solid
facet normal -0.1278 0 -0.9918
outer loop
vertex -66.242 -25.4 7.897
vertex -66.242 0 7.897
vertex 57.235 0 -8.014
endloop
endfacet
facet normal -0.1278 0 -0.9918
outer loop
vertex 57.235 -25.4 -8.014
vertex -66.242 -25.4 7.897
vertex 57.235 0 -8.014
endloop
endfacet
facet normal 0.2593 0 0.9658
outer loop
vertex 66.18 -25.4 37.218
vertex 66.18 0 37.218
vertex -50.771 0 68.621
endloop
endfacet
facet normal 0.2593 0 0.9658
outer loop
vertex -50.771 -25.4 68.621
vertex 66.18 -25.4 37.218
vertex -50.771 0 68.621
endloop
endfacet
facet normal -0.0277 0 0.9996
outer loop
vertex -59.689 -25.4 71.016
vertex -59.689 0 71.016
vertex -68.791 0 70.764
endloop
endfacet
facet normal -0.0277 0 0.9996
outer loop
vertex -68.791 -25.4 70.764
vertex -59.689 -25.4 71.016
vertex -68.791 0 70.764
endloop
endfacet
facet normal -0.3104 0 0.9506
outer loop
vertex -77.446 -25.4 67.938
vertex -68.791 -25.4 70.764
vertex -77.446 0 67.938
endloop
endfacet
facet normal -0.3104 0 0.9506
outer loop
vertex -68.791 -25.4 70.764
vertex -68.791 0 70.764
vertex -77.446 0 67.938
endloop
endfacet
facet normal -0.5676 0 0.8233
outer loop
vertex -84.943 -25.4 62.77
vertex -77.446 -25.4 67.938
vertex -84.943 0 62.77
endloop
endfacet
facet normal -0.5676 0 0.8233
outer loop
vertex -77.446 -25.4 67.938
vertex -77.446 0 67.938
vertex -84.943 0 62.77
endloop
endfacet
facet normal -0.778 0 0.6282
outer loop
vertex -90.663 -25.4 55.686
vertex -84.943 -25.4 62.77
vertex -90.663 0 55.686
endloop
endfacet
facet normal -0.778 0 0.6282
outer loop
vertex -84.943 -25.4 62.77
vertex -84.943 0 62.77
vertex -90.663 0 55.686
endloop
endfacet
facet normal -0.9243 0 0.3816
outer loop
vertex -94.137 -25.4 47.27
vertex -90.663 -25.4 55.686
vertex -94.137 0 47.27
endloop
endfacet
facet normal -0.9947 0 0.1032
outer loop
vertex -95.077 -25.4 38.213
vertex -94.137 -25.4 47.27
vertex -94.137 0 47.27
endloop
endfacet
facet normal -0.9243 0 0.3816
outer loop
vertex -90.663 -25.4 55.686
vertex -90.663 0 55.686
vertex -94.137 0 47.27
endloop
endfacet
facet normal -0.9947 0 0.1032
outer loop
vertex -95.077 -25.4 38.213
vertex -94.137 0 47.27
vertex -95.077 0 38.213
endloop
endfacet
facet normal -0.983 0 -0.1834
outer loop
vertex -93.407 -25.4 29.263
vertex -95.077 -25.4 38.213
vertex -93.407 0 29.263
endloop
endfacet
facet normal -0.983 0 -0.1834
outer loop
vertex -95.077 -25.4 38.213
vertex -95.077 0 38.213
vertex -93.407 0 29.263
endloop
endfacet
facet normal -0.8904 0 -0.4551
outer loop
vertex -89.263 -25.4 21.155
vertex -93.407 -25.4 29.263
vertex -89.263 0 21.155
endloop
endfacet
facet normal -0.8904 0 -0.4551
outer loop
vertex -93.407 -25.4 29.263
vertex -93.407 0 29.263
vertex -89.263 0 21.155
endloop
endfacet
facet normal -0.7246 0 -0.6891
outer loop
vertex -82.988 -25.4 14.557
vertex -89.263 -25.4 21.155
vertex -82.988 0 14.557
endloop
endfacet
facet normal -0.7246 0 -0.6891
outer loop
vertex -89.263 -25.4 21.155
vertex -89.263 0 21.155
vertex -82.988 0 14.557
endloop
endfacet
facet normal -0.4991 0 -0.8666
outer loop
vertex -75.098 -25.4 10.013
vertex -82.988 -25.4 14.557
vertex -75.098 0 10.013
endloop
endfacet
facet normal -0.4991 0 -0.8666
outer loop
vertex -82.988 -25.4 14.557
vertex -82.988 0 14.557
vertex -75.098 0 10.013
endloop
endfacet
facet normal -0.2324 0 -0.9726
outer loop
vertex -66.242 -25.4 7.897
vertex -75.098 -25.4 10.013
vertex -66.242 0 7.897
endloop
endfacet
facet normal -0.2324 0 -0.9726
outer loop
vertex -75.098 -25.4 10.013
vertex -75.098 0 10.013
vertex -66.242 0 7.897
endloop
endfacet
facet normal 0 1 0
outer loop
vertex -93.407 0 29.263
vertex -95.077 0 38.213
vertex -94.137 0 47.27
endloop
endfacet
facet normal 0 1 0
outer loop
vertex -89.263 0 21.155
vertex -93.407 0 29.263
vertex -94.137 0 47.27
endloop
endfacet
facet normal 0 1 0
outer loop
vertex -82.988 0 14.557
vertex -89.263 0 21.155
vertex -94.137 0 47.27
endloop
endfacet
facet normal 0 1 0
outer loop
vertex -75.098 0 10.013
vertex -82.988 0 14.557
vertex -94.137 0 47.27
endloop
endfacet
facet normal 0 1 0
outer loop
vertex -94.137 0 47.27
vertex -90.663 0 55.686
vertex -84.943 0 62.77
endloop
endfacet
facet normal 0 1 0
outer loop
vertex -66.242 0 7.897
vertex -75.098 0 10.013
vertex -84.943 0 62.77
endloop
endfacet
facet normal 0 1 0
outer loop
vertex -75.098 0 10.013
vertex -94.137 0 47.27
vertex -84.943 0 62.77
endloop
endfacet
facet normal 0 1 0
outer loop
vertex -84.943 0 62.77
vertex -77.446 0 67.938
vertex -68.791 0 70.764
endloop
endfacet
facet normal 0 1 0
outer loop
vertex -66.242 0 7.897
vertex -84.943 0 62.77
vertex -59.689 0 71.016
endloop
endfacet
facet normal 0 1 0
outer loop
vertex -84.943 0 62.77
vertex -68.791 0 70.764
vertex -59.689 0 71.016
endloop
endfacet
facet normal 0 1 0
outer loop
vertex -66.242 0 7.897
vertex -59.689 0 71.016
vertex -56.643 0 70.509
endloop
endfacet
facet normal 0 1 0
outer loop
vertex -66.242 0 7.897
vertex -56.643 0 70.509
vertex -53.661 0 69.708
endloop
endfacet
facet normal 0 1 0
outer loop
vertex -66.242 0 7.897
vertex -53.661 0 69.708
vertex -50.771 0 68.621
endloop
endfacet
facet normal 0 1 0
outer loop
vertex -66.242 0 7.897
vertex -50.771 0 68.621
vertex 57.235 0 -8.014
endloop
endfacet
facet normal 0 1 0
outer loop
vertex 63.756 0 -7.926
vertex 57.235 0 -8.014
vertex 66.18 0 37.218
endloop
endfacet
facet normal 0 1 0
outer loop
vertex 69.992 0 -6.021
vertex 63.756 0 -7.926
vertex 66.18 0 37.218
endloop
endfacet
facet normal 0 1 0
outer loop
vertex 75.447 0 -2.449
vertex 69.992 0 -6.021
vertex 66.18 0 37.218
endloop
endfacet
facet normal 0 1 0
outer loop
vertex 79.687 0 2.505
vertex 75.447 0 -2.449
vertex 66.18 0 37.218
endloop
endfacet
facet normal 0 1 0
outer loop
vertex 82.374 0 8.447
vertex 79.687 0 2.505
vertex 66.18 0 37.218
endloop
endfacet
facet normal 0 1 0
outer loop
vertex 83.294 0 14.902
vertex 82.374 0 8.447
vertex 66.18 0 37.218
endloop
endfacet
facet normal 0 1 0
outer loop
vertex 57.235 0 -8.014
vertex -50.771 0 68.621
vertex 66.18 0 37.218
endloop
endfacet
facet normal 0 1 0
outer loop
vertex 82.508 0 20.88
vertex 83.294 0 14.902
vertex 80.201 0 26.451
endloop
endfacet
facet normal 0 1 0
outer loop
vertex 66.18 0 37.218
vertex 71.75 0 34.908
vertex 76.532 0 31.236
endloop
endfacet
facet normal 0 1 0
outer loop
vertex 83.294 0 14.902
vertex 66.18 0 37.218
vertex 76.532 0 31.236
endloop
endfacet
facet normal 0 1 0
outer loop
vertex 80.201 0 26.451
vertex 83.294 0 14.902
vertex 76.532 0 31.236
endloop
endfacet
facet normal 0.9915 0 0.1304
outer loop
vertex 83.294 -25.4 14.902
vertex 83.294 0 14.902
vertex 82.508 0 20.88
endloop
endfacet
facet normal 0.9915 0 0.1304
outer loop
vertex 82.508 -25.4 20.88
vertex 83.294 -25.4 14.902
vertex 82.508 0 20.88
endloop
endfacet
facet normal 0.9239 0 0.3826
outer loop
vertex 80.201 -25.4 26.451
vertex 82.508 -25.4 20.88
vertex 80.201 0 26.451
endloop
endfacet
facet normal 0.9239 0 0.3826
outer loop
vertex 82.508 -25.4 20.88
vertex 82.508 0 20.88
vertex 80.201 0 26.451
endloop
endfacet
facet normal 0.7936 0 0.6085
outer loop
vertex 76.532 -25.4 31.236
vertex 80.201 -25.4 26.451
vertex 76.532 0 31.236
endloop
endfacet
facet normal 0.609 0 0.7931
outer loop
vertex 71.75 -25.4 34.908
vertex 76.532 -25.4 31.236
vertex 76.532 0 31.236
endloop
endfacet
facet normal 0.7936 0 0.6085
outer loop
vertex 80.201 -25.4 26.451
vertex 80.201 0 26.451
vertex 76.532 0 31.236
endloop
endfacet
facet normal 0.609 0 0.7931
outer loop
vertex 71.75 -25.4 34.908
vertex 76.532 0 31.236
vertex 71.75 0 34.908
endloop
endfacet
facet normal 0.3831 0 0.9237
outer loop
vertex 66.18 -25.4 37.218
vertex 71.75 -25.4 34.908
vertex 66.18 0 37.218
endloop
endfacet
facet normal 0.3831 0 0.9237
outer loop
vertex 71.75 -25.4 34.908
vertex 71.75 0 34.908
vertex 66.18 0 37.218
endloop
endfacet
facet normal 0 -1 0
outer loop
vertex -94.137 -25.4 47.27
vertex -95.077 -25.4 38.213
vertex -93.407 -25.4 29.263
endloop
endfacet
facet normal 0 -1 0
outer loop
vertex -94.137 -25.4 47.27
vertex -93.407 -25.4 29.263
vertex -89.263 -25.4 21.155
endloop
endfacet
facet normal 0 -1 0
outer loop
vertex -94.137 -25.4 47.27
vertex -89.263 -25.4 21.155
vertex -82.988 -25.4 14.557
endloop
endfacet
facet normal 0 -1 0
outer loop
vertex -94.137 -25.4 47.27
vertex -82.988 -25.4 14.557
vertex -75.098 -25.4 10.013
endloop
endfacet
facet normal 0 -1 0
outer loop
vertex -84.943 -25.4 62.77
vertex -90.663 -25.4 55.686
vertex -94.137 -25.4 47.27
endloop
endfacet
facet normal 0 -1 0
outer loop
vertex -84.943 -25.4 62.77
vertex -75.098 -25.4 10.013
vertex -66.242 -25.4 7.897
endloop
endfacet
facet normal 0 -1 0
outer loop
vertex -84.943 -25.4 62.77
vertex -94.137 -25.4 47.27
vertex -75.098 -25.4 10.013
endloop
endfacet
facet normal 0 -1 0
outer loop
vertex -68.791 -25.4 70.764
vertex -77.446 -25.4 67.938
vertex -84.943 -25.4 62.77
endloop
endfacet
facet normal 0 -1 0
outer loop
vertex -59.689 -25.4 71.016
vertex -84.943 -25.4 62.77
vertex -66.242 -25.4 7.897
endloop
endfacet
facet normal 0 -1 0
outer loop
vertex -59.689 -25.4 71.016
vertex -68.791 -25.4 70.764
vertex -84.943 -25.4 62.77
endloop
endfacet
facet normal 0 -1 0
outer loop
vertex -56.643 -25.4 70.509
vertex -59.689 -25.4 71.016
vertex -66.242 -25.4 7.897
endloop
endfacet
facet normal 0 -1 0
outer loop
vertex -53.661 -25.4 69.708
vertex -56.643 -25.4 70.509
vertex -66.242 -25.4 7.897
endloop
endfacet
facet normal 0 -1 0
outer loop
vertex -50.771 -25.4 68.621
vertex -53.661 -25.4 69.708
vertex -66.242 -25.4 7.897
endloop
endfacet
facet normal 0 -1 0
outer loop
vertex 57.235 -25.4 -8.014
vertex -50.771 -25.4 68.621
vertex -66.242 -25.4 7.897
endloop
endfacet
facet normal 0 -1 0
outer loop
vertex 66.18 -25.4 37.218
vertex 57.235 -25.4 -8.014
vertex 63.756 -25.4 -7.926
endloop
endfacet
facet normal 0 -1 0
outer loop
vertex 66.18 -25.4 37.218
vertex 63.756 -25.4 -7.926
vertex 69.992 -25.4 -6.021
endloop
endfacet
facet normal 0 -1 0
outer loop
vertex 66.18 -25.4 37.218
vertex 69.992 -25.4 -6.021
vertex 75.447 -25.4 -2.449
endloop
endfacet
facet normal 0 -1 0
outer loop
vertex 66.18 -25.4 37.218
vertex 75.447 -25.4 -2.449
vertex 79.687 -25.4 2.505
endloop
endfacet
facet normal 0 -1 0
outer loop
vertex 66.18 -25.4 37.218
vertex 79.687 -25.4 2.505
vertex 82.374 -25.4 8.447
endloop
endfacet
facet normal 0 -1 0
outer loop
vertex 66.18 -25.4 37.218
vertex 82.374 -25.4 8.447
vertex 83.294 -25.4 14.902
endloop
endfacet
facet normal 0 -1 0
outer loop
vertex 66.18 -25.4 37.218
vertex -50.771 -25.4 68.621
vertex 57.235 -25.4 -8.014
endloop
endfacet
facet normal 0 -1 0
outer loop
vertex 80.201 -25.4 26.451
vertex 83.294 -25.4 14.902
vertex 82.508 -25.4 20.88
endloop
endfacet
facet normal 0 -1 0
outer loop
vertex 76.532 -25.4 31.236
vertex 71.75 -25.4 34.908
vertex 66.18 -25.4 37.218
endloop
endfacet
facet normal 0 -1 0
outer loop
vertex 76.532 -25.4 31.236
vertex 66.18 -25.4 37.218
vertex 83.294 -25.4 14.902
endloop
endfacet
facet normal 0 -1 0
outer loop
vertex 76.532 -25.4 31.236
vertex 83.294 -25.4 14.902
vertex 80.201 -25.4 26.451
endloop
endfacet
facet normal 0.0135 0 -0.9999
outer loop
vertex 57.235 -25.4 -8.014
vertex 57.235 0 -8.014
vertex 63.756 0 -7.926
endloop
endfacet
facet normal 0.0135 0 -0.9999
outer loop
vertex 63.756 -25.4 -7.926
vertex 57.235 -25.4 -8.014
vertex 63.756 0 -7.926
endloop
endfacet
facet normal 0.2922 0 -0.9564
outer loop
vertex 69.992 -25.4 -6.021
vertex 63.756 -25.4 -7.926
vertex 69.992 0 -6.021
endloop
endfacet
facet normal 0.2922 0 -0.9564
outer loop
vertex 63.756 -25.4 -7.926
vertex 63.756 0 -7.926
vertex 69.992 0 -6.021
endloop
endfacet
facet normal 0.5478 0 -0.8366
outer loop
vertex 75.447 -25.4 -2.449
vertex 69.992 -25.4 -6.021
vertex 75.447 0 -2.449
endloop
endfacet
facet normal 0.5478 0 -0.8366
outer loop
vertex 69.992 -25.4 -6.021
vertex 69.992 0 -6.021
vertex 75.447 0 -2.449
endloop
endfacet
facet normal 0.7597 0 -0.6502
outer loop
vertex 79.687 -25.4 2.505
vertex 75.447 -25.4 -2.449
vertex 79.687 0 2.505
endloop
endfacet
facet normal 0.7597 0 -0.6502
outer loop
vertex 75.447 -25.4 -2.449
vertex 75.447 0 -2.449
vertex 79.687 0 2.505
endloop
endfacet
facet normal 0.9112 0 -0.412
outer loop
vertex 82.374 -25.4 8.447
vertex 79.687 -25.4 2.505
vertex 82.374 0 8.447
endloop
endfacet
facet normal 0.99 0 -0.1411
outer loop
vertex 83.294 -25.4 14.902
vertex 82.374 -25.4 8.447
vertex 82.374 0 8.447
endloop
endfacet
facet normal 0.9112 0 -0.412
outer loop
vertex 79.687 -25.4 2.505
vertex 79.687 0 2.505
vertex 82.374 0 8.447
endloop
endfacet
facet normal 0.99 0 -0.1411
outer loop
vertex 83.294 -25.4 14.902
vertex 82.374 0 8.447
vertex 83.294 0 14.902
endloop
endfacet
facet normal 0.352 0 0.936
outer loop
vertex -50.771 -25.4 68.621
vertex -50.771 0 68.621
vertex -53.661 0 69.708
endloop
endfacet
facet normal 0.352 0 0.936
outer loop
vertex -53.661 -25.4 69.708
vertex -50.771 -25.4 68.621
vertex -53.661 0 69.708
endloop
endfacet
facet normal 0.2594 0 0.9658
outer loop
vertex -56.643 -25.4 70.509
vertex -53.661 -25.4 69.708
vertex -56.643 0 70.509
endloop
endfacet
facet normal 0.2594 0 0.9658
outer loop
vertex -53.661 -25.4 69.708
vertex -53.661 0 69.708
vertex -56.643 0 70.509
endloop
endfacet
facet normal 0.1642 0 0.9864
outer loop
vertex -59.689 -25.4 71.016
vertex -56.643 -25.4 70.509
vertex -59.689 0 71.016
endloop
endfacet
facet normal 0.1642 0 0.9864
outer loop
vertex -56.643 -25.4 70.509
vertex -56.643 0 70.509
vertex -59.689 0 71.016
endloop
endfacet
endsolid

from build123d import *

# Parameters (mm, degrees)
F1_DEPTH = 25.4
F2_DEPTH = 25.4


with BuildPart() as f1:
    # F0 (on Front) → F1 (new body)
    with BuildSketch(Plane.XZ):
        with BuildLine():
            Line((-50.770752, 68.621059), (-59.689327, 71.015835))
            ThreePointArc((-59.689327, 71.015835), (-94.933334, 42.775326), (-66.24222, 7.897161))
            ThreePointArc((-66.24222, 7.897161), (-41.972825, 16.067976), (-31.63981, 39.498609))
            ThreePointArc((-31.63981, 39.498609), (-36.850348, 56.920649), (-50.770752, 68.621059))
        make_face()
        with BuildLine():
            ThreePointArc((-50.770752, 68.621059), (-55.142458, 70.144617), (-59.689327, 71.015835))
            Line((-59.689327, 71.015835), (-50.770752, 68.621059))
        make_face()
        with BuildLine():
            ThreePointArc((-31.63981, 39.498609), (-41.972825, 16.067976), (-66.24222, 7.897161))
            Line((-66.24222, 7.897161), (57.235367, -8.014038))
            ThreePointArc((57.235367, -8.014038), (37.521425, 19.385006), (66.180401, 37.217846))
            Line((66.180401, 37.217846), (-50.770752, 68.621059))
            ThreePointArc((-50.770752, 68.621059), (-36.850348, 56.920649), (-31.63981, 39.498609))
        make_face()
        with BuildLine():
            ThreePointArc((66.180401, 37.217846), (37.521425, 19.385006), (57.235367, -8.014038))
            ThreePointArc((57.235367, -8.014038), (75.446993, -2.448604), (83.294276, 14.902405))
            ThreePointArc((83.294276, 14.902405), (78.523231, 28.963554), (66.180401, 37.217846))
        make_face()
    extrude(amount=F1_DEPTH)

    # F0 (on Front) → F2 (join)
    with BuildSketch(Plane.XZ):
        with BuildLine():
            Line((-50.770752, 68.621059), (-59.689327, 71.015835))
            ThreePointArc((-59.689327, 71.015835), (-94.933334, 42.775326), (-66.24222, 7.897161))
            ThreePointArc((-66.24222, 7.897161), (-41.972825, 16.067976), (-31.63981, 39.498609))
            ThreePointArc((-31.63981, 39.498609), (-36.850348, 56.920649), (-50.770752, 68.621059))
        make_face()
        with BuildLine():
            ThreePointArc((-50.770752, 68.621059), (-55.142458, 70.144617), (-59.689327, 71.015835))
            Line((-59.689327, 71.015835), (-50.770752, 68.621059))
        make_face()
        with BuildLine():
            ThreePointArc((-31.63981, 39.498609), (-41.972825, 16.067976), (-66.24222, 7.897161))
            Line((-66.24222, 7.897161), (57.235367, -8.014038))
            ThreePointArc((57.235367, -8.014038), (37.521425, 19.385006), (66.180401, 37.217846))
            Line((66.180401, 37.217846), (-50.770752, 68.621059))
            ThreePointArc((-50.770752, 68.621059), (-36.850348, 56.920649), (-31.63981, 39.498609))
        make_face()
        with BuildLine():
            ThreePointArc((66.180401, 37.217846), (37.521425, 19.385006), (57.235367, -8.014038))
            ThreePointArc((57.235367, -8.014038), (75.446993, -2.448604), (83.294276, 14.902405))
            ThreePointArc((83.294276, 14.902405), (78.523231, 28.963554), (66.180401, 37.217846))
        make_face()
    extrude(amount=F2_DEPTH)


solid = f1.part
